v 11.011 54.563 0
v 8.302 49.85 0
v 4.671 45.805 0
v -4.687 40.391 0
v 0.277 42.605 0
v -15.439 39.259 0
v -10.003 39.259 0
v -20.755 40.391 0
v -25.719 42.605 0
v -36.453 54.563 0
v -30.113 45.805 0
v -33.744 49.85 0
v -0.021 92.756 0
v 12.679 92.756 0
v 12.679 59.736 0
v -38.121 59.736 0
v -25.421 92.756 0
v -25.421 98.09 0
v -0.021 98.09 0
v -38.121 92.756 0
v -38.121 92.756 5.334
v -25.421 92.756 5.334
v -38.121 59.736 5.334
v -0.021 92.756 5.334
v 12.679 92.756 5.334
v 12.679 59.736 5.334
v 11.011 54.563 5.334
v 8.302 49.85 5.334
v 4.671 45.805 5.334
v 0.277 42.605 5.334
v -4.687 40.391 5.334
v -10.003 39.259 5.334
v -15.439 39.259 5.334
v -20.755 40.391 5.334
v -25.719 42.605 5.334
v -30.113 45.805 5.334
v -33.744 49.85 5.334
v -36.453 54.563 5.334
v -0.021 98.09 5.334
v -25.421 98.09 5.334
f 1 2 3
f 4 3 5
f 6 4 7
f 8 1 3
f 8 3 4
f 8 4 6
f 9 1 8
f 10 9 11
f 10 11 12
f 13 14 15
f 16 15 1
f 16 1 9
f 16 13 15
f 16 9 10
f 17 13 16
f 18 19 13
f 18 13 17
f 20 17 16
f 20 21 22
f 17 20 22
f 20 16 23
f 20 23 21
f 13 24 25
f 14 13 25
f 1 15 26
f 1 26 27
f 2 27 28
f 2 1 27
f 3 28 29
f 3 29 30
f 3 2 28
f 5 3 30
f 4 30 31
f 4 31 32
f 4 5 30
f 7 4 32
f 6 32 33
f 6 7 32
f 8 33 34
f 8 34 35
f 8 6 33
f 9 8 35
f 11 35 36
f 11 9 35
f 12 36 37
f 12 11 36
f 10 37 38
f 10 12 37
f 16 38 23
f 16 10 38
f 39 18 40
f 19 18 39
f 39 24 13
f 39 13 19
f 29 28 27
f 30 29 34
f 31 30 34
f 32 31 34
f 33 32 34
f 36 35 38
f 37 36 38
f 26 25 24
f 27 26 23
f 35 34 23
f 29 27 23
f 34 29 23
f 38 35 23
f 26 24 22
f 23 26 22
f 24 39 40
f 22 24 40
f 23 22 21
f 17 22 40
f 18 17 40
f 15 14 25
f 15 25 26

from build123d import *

# Parameters (mm, degrees)
BOSS_EXTRUDE1_DEPTH = 5.334
SKETCH2_W           = 12.7
SKETCH2_H           = 5.334
CUT_EXTRUDE1_DEPTH  = 6.334


with BuildPart() as part:
    # Sketch1 → Boss-Extrude1 (new body)
    with BuildSketch(Plane.XY):
        with BuildLine():
            Line((-38.121026248, 59.736005595), (-38.121026248, 98.090005595))
            Line((-38.121026248, 98.090005595), (12.678973752, 98.090005595))
            Line((12.678973752, 98.090005595), (12.678973752, 59.736005595))
            ThreePointArc((12.678973752, 59.736005595), (-12.721026248, 39.115977854), (-38.121026248, 59.736005595))
        make_face()
    extrude(amount=BOSS_EXTRUDE1_DEPTH)

    # Sketch2 → Cut-Extrude1 (cut, through all)
    with BuildSketch(Plane.XY.offset(5.334)):
        with Locations((-31.771026248, 95.423005595)):
            Rectangle(SKETCH2_W, SKETCH2_H)
        with Locations((6.328973752, 95.423005595)):
            Rectangle(SKETCH2_W, SKETCH2_H)
    extrude(amount=-CUT_EXTRUDE1_DEPTH, mode=Mode.SUBTRACT)


solid = part.part
